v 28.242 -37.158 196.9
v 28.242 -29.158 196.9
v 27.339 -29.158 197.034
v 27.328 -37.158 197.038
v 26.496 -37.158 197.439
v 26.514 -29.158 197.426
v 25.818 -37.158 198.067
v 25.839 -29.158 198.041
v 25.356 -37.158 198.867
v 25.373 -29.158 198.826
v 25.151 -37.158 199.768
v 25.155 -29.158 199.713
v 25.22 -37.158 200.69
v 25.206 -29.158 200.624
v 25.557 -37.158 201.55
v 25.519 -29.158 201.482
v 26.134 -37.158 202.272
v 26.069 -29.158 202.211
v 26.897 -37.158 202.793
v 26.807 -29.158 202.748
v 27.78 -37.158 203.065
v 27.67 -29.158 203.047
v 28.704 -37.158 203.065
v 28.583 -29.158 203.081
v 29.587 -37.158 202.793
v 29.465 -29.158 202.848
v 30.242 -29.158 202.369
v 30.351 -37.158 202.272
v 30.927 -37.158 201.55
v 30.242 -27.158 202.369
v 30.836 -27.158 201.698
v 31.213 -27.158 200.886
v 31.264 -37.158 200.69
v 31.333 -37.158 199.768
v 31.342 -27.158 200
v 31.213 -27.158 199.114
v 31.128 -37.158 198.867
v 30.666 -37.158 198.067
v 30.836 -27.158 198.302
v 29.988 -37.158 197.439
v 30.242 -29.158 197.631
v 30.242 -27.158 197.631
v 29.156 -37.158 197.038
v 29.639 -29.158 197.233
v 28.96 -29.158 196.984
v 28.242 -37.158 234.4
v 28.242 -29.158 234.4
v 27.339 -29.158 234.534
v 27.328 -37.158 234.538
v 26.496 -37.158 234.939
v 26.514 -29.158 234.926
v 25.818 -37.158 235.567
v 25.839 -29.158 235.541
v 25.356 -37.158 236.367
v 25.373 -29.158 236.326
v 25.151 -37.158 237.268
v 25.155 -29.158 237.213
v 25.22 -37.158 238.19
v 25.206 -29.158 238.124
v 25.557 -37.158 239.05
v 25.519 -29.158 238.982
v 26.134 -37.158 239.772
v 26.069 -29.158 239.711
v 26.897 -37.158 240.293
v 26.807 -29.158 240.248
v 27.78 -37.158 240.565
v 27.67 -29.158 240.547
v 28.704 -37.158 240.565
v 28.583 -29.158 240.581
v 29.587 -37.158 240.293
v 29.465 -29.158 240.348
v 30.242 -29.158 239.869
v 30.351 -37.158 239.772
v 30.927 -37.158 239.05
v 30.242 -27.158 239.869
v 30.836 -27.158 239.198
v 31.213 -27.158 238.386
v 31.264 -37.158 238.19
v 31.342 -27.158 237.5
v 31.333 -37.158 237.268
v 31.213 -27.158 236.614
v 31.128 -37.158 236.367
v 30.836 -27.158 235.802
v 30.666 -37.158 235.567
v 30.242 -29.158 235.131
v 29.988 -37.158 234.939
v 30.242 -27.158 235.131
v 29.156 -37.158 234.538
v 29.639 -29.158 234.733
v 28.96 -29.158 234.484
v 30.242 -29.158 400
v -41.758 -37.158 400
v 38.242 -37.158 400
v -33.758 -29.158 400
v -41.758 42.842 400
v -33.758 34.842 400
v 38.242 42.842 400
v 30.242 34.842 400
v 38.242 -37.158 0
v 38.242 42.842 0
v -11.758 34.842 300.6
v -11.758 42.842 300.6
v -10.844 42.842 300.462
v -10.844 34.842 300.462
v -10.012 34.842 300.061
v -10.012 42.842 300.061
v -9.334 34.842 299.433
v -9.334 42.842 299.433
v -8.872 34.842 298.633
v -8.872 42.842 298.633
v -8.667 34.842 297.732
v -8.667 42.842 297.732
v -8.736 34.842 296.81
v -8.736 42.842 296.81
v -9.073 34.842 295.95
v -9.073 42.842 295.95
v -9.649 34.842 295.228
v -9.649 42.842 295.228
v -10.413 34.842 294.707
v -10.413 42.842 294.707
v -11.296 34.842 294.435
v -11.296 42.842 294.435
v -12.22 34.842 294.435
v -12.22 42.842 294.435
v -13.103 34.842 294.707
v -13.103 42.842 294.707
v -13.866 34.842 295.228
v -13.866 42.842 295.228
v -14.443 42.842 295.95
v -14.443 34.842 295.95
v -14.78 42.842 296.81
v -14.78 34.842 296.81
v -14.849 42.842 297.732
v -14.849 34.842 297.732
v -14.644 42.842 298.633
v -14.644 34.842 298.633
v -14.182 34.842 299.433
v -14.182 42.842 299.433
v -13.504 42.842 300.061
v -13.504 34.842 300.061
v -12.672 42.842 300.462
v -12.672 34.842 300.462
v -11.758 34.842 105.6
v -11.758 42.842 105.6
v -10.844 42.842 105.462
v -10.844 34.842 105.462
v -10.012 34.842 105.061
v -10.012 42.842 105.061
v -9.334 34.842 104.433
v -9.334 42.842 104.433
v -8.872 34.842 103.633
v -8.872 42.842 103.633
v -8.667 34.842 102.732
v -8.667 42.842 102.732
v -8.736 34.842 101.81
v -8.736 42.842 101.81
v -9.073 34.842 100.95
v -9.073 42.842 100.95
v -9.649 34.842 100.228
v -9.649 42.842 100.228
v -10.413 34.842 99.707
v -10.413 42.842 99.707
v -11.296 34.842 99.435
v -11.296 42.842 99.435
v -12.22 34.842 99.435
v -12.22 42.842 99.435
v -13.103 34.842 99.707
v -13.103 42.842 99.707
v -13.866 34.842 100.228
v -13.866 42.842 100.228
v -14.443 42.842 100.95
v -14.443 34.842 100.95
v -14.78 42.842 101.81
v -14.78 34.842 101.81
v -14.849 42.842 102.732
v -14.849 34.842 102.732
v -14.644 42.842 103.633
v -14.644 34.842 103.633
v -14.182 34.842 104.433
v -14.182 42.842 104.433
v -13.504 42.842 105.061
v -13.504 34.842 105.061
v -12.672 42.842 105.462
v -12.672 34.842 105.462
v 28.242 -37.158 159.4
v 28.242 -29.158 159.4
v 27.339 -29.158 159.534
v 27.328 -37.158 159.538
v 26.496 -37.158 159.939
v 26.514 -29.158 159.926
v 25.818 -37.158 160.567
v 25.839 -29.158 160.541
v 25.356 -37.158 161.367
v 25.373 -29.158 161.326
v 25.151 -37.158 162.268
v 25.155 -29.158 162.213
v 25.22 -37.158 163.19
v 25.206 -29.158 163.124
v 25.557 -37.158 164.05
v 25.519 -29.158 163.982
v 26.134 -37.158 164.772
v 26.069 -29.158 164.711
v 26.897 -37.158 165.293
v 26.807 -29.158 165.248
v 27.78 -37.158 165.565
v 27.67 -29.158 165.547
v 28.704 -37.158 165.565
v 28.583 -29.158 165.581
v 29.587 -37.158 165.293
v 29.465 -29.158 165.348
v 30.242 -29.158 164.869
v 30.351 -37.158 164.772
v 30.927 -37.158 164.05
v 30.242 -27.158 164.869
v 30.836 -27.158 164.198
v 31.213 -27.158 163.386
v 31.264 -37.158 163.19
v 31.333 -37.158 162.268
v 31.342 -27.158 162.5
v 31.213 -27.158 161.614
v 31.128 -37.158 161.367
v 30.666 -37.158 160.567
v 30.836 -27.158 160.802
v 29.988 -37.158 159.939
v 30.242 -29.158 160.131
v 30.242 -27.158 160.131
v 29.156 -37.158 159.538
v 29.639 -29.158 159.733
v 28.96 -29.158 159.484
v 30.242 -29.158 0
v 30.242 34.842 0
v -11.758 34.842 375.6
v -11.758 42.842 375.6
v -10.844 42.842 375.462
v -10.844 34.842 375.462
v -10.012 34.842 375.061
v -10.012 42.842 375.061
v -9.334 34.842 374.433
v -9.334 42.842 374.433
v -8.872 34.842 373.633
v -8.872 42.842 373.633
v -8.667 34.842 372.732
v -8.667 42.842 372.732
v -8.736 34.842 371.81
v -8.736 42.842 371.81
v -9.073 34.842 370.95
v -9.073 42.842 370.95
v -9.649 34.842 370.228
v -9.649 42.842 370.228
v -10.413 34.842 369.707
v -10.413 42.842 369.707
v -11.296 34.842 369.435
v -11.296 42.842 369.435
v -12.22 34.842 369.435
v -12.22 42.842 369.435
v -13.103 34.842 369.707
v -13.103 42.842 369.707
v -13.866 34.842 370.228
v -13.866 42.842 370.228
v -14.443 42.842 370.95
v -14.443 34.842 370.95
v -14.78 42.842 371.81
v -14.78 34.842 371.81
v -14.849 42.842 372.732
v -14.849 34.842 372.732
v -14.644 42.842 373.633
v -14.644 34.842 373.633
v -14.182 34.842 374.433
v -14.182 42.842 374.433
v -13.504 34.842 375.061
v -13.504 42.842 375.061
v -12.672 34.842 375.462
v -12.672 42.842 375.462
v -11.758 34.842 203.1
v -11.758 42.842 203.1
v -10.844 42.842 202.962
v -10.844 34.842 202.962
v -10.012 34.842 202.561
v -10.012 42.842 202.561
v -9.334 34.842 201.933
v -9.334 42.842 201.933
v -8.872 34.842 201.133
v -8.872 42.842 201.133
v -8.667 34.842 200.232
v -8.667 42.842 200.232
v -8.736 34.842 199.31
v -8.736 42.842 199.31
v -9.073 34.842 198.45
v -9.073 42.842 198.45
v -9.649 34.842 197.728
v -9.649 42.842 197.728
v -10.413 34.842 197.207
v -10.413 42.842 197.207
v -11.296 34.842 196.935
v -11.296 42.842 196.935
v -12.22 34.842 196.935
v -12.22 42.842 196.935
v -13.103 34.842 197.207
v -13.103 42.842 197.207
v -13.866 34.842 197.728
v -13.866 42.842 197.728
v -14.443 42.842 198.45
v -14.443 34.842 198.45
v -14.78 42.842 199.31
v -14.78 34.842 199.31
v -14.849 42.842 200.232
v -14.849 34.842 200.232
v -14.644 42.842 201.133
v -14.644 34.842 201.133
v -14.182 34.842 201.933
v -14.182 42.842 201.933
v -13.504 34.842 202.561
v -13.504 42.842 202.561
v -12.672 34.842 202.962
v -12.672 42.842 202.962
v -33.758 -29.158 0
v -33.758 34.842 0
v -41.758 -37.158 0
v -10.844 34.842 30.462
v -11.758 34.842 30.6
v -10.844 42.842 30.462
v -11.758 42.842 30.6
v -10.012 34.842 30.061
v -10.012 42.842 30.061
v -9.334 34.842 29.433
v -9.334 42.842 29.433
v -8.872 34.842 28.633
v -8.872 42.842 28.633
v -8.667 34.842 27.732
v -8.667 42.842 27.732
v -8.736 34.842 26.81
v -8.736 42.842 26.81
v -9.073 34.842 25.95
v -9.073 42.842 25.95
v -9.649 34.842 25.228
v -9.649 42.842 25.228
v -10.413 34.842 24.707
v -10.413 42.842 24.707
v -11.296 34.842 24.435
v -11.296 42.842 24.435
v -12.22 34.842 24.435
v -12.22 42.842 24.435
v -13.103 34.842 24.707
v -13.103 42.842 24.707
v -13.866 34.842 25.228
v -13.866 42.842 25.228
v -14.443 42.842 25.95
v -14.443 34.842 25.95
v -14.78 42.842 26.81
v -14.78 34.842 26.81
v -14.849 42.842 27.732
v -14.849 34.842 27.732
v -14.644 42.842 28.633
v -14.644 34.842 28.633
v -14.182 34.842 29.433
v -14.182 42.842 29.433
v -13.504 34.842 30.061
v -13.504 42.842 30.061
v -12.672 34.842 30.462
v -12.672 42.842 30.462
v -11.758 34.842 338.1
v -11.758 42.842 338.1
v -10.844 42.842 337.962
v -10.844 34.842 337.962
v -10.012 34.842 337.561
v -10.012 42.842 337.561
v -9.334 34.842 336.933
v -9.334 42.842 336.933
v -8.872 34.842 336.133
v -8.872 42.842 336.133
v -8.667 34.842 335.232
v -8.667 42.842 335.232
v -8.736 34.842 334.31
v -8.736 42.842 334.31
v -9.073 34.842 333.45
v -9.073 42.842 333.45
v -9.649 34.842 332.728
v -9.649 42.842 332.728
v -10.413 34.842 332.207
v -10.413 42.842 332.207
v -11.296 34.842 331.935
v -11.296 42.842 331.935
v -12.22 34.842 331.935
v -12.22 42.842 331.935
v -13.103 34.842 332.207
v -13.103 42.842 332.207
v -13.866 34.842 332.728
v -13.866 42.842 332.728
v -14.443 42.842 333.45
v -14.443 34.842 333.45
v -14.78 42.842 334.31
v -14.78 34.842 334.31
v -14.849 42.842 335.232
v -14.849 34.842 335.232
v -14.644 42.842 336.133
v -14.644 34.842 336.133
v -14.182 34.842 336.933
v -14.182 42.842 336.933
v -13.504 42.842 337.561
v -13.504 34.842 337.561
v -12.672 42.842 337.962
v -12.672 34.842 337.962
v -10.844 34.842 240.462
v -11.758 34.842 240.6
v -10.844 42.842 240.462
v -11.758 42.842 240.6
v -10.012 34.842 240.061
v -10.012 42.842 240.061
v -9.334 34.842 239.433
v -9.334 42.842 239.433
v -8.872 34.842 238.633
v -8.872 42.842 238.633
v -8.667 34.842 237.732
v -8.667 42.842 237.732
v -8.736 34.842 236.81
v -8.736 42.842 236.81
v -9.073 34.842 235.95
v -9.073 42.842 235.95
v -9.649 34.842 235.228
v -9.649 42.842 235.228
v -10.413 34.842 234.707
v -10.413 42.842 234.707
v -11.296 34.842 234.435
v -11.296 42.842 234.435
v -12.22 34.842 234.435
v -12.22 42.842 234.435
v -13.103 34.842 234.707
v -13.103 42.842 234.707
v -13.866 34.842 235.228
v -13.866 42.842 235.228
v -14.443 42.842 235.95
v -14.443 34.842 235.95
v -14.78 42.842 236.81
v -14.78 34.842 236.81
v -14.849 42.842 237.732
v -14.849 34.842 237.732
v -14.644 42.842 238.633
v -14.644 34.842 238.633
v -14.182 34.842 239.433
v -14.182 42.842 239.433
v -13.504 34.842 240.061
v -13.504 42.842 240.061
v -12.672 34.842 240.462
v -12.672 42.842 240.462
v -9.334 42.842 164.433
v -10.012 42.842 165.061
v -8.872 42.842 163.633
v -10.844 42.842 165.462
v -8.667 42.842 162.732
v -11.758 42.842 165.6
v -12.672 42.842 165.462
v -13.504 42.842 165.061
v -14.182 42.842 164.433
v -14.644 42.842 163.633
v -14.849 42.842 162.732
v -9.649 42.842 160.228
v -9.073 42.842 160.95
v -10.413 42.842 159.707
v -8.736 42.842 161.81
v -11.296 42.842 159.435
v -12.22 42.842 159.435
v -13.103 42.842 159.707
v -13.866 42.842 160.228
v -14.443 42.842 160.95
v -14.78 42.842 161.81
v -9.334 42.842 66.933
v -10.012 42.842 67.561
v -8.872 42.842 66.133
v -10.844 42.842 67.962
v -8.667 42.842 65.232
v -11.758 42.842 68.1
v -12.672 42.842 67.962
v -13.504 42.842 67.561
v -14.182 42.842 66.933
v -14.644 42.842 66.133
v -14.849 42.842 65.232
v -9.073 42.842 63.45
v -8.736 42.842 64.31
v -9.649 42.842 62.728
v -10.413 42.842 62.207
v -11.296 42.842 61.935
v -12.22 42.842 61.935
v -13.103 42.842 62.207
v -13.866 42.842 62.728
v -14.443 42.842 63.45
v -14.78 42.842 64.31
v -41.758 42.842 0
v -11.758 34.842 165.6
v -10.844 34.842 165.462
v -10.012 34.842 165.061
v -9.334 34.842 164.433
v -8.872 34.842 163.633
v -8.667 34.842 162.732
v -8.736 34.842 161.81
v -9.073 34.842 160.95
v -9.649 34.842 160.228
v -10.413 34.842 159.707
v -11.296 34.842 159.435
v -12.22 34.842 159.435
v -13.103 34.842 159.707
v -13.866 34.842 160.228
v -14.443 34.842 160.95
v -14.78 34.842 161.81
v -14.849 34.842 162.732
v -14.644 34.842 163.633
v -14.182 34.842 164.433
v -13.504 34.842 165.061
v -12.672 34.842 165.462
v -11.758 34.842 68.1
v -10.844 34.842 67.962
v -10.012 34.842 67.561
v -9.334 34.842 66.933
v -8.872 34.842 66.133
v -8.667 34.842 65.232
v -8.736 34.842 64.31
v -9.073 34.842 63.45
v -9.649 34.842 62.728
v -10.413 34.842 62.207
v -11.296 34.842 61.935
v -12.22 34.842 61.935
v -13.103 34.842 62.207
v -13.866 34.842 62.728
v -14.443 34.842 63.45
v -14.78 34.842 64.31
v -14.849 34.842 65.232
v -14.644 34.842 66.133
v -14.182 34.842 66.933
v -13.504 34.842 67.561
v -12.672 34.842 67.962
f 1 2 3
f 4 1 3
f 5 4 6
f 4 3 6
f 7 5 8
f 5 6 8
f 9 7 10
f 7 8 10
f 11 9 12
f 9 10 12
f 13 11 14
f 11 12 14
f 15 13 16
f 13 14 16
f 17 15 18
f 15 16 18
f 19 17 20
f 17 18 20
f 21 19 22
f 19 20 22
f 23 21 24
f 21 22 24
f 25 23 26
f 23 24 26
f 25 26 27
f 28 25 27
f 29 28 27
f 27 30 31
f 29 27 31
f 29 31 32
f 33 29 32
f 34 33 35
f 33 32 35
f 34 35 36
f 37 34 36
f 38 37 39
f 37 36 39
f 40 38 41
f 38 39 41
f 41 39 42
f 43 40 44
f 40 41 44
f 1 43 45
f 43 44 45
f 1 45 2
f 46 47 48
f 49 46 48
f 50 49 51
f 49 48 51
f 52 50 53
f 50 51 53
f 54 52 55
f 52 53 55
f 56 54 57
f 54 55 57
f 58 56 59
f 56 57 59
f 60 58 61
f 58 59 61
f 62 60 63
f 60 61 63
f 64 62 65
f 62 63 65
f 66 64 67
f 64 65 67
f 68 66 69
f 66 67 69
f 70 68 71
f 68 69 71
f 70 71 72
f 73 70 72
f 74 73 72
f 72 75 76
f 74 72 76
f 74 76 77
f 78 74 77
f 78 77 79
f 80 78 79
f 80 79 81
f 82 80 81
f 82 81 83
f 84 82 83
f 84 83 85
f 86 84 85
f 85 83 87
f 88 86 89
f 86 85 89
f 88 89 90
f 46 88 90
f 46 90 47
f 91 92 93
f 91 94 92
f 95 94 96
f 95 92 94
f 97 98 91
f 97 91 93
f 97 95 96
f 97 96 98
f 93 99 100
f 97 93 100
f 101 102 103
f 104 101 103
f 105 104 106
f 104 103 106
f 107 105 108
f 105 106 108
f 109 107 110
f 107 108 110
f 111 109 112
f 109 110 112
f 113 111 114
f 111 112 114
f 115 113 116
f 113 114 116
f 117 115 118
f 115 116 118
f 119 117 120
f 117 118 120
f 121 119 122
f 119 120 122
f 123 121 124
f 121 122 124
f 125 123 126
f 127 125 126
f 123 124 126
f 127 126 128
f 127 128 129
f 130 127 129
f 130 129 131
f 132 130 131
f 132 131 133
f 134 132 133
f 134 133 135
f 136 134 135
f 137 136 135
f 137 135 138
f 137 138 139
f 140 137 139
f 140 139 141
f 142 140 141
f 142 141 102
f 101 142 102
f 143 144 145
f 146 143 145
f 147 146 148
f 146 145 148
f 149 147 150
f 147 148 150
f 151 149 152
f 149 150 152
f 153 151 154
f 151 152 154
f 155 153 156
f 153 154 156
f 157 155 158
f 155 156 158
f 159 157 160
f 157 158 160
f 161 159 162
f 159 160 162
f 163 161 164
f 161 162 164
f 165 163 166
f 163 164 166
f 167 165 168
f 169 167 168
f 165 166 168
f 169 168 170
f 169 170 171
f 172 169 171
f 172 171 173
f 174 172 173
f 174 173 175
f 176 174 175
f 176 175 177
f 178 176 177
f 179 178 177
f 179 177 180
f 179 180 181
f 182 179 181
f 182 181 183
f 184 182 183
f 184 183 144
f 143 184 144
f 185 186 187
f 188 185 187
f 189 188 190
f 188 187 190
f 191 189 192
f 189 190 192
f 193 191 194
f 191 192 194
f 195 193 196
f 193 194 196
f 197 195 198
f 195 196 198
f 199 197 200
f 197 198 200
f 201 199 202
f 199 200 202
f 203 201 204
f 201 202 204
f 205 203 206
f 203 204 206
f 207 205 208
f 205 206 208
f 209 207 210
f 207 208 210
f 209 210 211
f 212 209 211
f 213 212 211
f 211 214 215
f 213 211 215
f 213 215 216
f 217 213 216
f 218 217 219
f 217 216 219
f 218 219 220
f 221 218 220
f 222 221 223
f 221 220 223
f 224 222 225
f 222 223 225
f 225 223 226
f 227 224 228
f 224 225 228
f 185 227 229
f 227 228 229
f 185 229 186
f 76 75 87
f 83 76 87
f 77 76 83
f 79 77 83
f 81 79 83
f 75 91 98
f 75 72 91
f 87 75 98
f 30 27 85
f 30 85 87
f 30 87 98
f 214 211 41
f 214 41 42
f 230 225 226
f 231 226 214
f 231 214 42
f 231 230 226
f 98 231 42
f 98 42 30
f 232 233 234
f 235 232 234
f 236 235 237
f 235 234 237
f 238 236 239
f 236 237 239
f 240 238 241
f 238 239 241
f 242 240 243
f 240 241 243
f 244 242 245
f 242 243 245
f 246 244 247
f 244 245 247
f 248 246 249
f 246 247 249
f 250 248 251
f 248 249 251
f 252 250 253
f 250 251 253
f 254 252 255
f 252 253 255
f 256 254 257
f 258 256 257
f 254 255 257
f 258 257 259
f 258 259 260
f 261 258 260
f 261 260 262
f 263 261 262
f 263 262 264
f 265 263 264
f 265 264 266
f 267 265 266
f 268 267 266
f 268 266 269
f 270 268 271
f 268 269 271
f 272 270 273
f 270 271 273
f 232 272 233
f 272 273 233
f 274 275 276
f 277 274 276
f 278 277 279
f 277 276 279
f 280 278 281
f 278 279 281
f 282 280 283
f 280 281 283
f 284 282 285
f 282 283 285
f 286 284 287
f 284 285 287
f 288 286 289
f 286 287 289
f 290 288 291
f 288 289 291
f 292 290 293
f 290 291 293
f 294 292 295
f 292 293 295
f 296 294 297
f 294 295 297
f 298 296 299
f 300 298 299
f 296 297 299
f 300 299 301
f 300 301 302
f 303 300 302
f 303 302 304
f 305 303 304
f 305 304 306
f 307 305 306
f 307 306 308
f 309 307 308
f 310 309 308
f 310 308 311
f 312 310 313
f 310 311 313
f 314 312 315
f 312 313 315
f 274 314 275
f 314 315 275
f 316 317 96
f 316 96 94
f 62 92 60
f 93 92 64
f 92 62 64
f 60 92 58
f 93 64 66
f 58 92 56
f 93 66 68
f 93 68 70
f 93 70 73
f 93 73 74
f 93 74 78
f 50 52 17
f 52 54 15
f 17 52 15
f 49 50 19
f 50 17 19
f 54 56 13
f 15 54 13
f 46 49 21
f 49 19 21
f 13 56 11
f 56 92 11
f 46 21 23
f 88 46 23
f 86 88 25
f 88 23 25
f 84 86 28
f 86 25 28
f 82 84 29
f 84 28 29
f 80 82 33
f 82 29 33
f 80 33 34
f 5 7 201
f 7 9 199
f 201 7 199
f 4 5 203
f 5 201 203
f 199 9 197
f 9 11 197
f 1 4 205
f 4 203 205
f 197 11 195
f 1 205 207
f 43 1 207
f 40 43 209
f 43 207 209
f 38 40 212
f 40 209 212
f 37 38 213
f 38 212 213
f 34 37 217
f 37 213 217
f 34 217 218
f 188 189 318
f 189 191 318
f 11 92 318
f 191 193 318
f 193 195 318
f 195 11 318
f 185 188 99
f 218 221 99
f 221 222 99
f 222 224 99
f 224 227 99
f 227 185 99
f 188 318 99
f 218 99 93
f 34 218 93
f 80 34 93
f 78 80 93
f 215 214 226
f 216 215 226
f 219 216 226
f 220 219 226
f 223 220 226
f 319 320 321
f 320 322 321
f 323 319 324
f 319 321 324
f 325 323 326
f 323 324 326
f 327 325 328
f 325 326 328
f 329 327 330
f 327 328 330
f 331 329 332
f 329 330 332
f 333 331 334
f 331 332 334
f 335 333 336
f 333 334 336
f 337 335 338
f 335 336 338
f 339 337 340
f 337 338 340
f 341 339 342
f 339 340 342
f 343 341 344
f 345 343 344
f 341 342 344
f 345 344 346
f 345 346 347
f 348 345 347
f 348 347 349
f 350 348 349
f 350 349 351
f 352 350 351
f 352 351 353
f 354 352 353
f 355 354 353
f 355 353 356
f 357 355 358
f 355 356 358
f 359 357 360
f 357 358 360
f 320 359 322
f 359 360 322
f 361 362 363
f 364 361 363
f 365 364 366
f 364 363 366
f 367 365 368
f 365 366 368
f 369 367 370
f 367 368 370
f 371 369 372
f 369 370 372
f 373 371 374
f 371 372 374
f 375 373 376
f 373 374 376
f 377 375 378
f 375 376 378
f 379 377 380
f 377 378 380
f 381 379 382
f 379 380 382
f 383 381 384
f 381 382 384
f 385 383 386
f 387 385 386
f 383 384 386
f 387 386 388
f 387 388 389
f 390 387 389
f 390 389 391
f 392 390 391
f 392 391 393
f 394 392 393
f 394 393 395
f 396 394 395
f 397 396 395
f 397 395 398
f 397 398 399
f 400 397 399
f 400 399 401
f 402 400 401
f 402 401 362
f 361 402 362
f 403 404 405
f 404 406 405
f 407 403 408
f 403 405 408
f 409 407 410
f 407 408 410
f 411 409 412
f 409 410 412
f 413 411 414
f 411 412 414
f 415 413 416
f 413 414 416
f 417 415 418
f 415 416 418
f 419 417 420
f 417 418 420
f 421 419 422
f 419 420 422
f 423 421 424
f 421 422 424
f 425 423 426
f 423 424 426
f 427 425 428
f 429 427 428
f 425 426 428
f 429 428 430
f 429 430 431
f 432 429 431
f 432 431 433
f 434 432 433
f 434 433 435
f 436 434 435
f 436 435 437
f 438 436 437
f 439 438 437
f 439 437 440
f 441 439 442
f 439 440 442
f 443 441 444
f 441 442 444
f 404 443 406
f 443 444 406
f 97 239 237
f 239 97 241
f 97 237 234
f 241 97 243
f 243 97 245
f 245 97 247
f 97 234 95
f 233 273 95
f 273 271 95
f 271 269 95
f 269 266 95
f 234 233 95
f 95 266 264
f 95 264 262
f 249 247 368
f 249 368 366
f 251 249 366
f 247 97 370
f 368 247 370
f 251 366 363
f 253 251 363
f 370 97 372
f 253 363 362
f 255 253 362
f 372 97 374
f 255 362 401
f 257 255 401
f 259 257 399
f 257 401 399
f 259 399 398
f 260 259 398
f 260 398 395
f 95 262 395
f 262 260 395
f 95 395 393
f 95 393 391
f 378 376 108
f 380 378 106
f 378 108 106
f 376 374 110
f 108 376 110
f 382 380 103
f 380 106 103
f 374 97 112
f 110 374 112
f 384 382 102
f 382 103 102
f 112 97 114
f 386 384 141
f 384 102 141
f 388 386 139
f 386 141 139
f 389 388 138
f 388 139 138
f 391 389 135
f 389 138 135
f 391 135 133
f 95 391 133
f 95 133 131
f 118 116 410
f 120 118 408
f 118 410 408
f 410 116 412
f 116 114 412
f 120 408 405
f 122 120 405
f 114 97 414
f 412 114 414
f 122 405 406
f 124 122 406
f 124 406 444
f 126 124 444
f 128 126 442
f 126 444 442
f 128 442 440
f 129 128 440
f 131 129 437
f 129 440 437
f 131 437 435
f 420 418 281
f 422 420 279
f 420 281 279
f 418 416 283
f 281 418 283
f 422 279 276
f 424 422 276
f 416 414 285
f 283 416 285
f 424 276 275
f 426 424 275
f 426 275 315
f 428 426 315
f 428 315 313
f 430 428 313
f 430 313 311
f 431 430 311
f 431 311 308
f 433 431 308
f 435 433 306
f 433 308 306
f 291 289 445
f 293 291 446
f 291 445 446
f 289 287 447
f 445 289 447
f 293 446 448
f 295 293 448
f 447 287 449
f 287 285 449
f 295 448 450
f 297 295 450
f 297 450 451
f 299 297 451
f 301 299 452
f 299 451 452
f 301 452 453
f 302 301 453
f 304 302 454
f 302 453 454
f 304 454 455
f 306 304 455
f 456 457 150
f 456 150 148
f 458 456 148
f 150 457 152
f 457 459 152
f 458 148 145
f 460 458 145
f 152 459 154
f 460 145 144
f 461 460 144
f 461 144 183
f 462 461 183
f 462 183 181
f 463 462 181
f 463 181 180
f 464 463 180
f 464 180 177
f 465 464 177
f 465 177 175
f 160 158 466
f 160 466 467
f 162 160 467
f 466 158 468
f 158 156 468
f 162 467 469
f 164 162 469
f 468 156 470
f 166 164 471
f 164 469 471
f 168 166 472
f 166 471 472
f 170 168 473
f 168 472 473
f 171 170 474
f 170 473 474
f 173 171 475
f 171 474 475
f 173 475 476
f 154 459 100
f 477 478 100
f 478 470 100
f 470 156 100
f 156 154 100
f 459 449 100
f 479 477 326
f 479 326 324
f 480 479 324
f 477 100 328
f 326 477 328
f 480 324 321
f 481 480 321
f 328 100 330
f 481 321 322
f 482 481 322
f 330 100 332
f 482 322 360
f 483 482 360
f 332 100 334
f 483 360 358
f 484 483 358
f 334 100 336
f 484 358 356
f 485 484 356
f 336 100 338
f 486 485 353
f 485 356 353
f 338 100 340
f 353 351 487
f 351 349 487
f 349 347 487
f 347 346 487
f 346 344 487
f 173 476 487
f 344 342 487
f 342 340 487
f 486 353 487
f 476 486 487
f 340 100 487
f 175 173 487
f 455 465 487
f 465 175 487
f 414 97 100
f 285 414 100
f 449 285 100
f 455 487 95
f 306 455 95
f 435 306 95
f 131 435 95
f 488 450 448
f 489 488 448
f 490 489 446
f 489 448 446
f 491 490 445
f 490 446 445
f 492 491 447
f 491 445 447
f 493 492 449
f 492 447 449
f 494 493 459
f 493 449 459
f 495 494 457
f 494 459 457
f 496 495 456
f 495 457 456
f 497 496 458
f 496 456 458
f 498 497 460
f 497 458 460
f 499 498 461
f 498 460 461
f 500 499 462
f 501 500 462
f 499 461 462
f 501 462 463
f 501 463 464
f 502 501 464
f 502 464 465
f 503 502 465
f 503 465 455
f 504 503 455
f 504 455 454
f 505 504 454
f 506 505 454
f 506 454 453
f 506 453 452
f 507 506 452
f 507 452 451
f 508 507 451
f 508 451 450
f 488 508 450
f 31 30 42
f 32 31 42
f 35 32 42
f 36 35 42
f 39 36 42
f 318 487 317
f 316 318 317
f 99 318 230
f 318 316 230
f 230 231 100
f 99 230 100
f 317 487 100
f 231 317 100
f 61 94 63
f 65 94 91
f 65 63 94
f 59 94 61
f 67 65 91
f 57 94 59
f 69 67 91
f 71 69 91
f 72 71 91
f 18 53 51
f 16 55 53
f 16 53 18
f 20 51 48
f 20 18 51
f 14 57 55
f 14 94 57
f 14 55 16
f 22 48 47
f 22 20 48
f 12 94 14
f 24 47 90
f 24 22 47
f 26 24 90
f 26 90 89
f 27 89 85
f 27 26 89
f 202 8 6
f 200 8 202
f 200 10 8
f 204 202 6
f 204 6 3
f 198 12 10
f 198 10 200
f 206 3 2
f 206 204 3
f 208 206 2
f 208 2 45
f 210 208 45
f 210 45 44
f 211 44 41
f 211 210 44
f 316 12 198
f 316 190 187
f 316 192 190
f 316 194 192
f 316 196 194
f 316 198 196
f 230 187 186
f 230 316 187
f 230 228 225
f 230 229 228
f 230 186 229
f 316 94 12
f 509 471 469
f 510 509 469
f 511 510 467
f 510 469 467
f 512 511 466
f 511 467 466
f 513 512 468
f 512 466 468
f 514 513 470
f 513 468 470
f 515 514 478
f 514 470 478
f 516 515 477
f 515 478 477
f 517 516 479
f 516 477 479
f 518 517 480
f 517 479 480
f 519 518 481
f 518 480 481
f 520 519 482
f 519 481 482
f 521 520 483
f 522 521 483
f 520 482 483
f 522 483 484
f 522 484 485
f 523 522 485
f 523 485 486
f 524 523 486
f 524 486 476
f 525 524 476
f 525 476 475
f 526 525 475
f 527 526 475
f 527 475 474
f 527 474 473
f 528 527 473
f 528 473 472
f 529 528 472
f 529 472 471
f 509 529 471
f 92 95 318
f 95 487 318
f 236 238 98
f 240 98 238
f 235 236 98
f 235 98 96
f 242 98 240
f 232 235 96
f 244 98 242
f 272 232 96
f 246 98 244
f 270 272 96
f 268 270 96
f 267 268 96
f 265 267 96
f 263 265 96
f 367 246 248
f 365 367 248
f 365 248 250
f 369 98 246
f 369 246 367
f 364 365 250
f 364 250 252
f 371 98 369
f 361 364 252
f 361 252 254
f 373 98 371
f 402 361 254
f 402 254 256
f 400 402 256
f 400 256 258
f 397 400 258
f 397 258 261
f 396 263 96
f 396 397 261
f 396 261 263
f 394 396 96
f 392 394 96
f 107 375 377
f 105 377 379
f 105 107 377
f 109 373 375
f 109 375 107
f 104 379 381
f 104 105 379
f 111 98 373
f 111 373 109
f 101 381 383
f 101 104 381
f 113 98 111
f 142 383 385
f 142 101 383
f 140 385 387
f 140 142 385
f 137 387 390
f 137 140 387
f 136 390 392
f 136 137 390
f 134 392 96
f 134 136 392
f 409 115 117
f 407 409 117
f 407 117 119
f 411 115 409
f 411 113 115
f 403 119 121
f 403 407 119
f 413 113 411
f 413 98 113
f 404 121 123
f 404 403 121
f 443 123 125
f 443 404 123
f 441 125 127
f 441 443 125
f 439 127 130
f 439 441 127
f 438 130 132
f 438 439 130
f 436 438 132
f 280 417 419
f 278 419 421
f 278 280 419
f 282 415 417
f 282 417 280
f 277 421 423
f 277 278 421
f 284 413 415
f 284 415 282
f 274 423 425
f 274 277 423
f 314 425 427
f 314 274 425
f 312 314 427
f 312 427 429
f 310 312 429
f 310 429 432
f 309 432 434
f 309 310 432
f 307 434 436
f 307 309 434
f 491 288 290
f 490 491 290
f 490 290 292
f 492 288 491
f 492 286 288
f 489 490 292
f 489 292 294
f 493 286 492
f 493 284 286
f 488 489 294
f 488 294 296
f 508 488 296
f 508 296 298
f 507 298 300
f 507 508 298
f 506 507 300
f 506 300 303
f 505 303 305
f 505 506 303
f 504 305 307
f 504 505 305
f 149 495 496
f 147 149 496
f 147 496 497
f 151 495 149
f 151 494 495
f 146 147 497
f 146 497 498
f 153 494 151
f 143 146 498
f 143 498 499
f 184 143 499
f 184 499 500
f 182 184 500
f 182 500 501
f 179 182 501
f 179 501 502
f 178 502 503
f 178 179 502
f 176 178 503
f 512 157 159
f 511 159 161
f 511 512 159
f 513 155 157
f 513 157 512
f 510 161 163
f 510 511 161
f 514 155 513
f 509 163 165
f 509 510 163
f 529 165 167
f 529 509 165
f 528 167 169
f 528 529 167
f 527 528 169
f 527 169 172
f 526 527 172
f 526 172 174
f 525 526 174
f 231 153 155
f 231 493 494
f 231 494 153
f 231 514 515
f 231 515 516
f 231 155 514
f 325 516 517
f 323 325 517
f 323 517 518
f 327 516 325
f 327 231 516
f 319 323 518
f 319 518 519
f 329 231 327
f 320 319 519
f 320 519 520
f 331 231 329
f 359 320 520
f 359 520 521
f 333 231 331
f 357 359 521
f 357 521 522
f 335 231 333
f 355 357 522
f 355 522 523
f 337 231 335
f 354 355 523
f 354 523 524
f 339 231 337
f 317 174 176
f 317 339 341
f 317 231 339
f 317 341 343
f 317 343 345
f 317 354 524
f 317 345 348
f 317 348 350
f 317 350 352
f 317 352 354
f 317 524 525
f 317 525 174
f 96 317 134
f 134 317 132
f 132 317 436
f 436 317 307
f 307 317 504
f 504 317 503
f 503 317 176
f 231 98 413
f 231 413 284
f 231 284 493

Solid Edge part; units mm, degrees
sketch "Sketch1" plane through (0, 0, 0) normal (0, 0, 1) x (1, 0, 0)
  line L0 (-33.7579, 34.8421) -> (-33.7579, -29.1579)
  line L1 (-33.7579, -29.1579) -> (30.2421, -29.1579)
  line L2 (30.2421, -29.1579) -> (30.2421, 34.8421)
  line L3 (30.2421, 34.8421) -> (-33.7579, 34.8421)
  line L4 (-41.7579, 42.8421) -> (-41.7579, -37.1579)
  line L5 (-41.7579, -37.1579) -> (38.2421, -37.1579)
  line L6 (38.2421, -37.1579) -> (38.2421, 42.8421)
  line L7 (38.2421, 42.8421) -> (-41.7579, 42.8421)
  dimension "D1" = 80
  dimension "D2" = 80
  dimension "D3" = 8
  dimension "D4" = 8
  dimension "D5" = 8
  dimension "D6" = 8
extrude "Protrusion1" add sketch "Sketch1" along normal blind 400
hole "Hole_10" at (28.2421, -37.1579, 200) direction (0, 1, 0) diameter 6.2 depth 10
hole "Hole1" at (28.2421, -37.1579, 162.5) direction (0, 1, 0) diameter 6.2 depth 10
hole "Hole2" at (28.2421, -37.1579, 237.5) direction (0, 1, 0) diameter 6.2 depth 10
hole "Hole_13" at (-11.7579, 42.8421, 65) direction (0, -1, 0) diameter 6.2 end up to next
hole "Hole3" at (-11.7579, 42.8421, 102.5) direction (0, -1, 0) diameter 6.2 end up to next
hole "Hole4" at (-11.7579, 42.8421, 162.5) direction (0, -1, 0) diameter 6.2 end up to next
hole "Hole5" at (-11.7579, 42.8421, 200) direction (0, -1, 0) diameter 6.2 end up to next
hole "Hole6" at (-11.7579, 42.8421, 237.5) direction (0, -1, 0) diameter 6.2 end up to next
hole "Hole7" at (-11.7579, 42.8421, 297.5) direction (0, -1, 0) diameter 6.2 end up to next
hole "Hole8" at (-11.7579, 42.8421, 335) direction (0, -1, 0) diameter 6.2 end up to next
hole "Hole9" at (-11.7579, 42.8421, 372.5) direction (0, -1, 0) diameter 6.2 end up to next
hole "Hole10" at (-11.7579, 42.8421, 27.5) direction (0, -1, 0) diameter 6.2 end up to next
